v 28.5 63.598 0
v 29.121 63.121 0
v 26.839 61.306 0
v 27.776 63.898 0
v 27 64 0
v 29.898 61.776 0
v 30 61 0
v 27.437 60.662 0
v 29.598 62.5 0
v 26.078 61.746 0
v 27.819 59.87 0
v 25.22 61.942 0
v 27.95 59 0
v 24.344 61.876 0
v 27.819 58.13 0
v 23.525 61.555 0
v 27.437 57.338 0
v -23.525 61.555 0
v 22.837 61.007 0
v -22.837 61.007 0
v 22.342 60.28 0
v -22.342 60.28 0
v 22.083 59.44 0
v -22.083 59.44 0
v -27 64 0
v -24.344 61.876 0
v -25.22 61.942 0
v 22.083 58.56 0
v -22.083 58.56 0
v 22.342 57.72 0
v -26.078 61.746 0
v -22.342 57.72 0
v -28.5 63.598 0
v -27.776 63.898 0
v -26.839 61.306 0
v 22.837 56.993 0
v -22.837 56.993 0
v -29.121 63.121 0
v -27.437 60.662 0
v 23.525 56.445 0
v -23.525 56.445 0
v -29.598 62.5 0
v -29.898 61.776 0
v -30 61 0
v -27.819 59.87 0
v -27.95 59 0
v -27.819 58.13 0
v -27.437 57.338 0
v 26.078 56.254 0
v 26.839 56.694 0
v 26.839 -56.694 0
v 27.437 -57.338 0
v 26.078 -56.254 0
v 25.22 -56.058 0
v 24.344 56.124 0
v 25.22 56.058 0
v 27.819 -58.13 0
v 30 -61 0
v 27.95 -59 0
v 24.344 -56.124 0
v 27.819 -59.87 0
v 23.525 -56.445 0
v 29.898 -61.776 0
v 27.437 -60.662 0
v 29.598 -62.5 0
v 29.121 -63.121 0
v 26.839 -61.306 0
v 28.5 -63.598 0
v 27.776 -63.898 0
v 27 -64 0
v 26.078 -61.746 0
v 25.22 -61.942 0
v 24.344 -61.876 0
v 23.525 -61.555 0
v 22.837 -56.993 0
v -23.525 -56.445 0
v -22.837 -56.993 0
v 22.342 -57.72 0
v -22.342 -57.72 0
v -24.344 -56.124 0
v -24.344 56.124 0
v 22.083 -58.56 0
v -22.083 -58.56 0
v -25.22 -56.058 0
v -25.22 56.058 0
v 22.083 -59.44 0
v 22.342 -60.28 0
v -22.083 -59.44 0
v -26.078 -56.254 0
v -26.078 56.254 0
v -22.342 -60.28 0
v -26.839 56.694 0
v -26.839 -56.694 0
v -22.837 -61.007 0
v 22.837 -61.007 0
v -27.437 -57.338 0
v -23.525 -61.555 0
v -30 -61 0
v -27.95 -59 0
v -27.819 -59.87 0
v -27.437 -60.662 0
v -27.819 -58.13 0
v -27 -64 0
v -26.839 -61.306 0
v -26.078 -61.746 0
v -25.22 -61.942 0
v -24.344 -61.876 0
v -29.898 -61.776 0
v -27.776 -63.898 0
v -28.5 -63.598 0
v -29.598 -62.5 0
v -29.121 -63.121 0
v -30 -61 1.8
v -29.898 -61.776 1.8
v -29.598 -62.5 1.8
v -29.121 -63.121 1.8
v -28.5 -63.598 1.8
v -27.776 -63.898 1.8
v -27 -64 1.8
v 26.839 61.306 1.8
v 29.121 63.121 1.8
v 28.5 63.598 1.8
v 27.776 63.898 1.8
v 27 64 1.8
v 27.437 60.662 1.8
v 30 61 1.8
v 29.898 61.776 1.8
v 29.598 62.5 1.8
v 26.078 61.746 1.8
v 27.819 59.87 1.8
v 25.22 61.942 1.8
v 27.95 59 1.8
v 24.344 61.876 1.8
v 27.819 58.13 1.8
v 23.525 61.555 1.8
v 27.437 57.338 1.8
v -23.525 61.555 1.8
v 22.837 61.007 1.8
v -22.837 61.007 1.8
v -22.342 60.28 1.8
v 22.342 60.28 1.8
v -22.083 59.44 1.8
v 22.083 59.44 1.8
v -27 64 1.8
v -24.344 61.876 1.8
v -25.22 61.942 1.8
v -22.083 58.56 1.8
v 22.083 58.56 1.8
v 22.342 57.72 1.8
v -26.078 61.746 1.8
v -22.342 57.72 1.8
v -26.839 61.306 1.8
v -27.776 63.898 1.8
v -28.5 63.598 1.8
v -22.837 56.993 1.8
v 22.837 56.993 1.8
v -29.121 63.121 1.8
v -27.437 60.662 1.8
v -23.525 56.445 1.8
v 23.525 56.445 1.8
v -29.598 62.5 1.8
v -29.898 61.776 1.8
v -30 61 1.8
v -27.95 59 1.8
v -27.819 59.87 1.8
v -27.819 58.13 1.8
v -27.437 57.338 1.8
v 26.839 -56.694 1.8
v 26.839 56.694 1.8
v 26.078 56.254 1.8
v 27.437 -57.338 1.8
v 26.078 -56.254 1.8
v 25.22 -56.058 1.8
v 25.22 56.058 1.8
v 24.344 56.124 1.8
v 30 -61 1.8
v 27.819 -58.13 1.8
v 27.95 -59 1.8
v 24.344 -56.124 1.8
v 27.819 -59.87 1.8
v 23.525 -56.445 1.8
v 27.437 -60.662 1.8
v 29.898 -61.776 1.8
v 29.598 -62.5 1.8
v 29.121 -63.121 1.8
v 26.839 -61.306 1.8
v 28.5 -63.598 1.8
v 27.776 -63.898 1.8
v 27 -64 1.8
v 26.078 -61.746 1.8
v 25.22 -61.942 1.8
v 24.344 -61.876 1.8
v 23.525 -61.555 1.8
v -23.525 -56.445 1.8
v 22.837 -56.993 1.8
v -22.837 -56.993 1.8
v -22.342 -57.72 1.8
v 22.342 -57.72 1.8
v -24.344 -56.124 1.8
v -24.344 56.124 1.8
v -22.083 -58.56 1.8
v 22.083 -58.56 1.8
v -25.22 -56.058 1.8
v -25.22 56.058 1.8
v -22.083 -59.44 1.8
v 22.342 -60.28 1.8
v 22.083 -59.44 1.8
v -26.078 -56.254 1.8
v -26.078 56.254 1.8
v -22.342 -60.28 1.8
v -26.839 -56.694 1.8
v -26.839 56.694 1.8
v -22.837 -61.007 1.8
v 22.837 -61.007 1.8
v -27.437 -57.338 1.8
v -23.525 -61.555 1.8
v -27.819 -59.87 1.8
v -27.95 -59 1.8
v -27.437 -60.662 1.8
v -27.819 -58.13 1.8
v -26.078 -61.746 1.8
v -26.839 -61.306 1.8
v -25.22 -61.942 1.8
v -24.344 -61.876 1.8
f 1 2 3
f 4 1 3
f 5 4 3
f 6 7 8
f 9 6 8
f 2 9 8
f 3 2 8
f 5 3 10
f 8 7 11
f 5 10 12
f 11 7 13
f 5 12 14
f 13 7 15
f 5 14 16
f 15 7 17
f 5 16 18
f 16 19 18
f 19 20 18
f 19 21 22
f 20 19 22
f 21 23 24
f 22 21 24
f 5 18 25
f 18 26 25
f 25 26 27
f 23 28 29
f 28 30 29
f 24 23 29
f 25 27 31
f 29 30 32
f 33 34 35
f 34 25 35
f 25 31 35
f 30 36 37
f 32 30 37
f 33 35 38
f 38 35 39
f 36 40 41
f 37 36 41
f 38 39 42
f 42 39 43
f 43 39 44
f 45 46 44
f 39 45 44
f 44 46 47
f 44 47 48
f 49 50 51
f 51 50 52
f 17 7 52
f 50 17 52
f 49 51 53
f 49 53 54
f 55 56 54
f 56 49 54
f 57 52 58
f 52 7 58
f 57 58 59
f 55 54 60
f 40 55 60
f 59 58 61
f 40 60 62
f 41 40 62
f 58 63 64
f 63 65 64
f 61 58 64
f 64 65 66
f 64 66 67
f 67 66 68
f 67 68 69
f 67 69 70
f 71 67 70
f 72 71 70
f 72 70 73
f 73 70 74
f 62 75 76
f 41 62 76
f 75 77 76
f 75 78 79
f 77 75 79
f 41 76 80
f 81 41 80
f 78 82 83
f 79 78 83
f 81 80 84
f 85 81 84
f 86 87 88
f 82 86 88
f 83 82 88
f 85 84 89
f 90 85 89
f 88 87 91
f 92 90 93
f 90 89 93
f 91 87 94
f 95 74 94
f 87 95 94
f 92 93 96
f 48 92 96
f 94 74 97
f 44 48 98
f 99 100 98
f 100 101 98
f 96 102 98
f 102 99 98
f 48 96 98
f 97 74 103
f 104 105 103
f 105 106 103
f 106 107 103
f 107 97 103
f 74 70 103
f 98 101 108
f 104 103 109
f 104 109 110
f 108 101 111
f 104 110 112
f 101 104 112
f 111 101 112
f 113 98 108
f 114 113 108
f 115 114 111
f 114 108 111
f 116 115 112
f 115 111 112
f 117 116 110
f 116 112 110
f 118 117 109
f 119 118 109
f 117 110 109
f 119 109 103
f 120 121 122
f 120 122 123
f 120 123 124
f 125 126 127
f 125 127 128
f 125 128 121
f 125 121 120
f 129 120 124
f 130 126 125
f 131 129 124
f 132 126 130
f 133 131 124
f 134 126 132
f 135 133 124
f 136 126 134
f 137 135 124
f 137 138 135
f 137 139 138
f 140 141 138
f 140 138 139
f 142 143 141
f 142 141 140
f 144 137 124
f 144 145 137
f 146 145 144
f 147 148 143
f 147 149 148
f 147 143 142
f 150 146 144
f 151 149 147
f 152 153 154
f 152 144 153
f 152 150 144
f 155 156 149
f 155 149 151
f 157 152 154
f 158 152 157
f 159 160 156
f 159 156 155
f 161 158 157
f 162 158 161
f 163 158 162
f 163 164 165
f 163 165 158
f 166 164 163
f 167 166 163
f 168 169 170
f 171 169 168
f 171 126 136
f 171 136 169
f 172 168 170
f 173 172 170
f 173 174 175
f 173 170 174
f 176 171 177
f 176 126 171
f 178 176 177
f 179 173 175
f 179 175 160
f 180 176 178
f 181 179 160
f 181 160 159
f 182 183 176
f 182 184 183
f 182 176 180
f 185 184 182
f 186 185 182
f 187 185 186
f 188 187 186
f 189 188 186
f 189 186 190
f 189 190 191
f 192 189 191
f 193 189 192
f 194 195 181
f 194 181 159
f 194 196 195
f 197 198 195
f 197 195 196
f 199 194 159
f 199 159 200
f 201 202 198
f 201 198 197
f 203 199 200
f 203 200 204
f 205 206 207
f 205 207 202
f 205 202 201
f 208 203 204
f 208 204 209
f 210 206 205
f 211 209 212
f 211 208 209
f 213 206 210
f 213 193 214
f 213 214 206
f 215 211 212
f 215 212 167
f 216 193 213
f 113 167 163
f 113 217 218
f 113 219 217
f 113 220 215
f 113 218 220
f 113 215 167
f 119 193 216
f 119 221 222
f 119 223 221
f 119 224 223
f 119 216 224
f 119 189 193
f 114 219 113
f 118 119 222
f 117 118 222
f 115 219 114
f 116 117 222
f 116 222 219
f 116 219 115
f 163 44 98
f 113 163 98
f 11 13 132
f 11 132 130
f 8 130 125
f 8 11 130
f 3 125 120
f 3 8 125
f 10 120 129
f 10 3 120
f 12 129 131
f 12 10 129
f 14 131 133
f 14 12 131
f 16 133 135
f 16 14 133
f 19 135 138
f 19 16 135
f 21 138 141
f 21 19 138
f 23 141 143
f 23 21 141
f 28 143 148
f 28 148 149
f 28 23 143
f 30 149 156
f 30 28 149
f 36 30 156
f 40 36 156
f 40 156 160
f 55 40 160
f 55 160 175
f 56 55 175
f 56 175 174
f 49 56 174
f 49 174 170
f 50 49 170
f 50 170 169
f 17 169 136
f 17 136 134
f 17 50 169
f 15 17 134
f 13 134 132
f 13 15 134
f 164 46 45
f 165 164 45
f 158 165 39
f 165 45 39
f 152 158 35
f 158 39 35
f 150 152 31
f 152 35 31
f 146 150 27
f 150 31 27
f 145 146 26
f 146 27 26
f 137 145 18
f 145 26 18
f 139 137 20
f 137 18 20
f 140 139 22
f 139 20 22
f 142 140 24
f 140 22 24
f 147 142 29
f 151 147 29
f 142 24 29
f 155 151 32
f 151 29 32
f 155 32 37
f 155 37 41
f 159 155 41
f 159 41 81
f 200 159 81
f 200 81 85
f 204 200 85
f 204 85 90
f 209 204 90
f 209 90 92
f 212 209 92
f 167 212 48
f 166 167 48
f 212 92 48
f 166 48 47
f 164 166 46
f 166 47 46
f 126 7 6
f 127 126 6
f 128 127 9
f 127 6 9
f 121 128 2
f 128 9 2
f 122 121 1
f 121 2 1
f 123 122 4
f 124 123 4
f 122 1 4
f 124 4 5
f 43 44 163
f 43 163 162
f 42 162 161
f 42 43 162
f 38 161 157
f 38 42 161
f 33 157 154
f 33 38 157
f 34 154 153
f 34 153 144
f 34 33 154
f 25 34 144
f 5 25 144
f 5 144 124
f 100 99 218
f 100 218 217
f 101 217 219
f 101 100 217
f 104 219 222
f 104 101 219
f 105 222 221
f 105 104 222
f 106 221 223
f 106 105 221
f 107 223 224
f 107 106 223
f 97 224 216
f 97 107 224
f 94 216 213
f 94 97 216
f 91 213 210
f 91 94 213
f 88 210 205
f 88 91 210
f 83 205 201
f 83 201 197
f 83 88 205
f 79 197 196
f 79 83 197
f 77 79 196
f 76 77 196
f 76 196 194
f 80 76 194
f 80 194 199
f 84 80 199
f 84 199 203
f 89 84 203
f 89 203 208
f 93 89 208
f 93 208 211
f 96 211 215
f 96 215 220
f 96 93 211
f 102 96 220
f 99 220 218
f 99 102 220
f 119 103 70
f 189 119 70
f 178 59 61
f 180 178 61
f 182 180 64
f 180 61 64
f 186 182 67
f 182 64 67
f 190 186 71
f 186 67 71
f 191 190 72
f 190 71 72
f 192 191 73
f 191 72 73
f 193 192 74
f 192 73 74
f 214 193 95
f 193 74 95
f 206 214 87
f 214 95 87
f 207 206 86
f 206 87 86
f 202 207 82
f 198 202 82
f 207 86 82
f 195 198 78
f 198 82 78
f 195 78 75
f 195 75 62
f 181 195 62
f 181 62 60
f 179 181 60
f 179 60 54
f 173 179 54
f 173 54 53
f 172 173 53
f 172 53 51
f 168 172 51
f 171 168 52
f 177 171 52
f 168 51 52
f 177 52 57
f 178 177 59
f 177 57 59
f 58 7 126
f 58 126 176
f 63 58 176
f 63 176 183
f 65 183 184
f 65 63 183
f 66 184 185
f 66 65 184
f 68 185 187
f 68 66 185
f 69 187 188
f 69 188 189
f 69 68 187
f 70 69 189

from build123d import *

# Parameters (mm, degrees)
SKETCH_R             = 2.95
PAD_DEPTH            = 1.8
SKETCH_MIRRORED_2_R  = 2.95
PAD_MIRRORED_2_DEPTH = 1.8


with BuildPart() as part:
    # Sketch → Pad (new body)
    with BuildSketch(Plane.XY):
        with BuildLine():
            Line((0, 0), (30, 0))
            Line((30, 0), (30, 61))
            ThreePointArc((30, 61), (29.12132, 63.12132), (27, 64))
            Line((27, 64), (0, 64))
            Line((0, 64), (0, 0))
        make_face()
        with Locations((25, 59)):
            Circle(SKETCH_R, mode=Mode.SUBTRACT)
    pad = extrude(amount=PAD_DEPTH)

    # Sketch Mirrored 2 → Pad Mirrored 2 (add)
    with BuildSketch(Plane(origin=(0, 0, 0), x_dir=(-1, 0, 0), z_dir=(0, 0, -1))):
        with BuildLine():
            Line((0, 0), (30, 0))
            Line((30, 0), (30, 61))
            ThreePointArc((30, 61), (29.12132, 63.12132), (27, 64))
            Line((27, 64), (0, 64))
            Line((0, 64), (0, 0))
        make_face()
        with Locations((25, 59)):
            Circle(SKETCH_MIRRORED_2_R, mode=Mode.SUBTRACT)
    pad_mirrored_2 = extrude(amount=-PAD_MIRRORED_2_DEPTH)

    # Mirrored001: Pad, Pad Mirrored 2 across Sketch H_Axis
    add(pad.mirror(Plane.ZX))
    add(pad_mirrored_2.mirror(Plane.ZX))


solid = part.part
